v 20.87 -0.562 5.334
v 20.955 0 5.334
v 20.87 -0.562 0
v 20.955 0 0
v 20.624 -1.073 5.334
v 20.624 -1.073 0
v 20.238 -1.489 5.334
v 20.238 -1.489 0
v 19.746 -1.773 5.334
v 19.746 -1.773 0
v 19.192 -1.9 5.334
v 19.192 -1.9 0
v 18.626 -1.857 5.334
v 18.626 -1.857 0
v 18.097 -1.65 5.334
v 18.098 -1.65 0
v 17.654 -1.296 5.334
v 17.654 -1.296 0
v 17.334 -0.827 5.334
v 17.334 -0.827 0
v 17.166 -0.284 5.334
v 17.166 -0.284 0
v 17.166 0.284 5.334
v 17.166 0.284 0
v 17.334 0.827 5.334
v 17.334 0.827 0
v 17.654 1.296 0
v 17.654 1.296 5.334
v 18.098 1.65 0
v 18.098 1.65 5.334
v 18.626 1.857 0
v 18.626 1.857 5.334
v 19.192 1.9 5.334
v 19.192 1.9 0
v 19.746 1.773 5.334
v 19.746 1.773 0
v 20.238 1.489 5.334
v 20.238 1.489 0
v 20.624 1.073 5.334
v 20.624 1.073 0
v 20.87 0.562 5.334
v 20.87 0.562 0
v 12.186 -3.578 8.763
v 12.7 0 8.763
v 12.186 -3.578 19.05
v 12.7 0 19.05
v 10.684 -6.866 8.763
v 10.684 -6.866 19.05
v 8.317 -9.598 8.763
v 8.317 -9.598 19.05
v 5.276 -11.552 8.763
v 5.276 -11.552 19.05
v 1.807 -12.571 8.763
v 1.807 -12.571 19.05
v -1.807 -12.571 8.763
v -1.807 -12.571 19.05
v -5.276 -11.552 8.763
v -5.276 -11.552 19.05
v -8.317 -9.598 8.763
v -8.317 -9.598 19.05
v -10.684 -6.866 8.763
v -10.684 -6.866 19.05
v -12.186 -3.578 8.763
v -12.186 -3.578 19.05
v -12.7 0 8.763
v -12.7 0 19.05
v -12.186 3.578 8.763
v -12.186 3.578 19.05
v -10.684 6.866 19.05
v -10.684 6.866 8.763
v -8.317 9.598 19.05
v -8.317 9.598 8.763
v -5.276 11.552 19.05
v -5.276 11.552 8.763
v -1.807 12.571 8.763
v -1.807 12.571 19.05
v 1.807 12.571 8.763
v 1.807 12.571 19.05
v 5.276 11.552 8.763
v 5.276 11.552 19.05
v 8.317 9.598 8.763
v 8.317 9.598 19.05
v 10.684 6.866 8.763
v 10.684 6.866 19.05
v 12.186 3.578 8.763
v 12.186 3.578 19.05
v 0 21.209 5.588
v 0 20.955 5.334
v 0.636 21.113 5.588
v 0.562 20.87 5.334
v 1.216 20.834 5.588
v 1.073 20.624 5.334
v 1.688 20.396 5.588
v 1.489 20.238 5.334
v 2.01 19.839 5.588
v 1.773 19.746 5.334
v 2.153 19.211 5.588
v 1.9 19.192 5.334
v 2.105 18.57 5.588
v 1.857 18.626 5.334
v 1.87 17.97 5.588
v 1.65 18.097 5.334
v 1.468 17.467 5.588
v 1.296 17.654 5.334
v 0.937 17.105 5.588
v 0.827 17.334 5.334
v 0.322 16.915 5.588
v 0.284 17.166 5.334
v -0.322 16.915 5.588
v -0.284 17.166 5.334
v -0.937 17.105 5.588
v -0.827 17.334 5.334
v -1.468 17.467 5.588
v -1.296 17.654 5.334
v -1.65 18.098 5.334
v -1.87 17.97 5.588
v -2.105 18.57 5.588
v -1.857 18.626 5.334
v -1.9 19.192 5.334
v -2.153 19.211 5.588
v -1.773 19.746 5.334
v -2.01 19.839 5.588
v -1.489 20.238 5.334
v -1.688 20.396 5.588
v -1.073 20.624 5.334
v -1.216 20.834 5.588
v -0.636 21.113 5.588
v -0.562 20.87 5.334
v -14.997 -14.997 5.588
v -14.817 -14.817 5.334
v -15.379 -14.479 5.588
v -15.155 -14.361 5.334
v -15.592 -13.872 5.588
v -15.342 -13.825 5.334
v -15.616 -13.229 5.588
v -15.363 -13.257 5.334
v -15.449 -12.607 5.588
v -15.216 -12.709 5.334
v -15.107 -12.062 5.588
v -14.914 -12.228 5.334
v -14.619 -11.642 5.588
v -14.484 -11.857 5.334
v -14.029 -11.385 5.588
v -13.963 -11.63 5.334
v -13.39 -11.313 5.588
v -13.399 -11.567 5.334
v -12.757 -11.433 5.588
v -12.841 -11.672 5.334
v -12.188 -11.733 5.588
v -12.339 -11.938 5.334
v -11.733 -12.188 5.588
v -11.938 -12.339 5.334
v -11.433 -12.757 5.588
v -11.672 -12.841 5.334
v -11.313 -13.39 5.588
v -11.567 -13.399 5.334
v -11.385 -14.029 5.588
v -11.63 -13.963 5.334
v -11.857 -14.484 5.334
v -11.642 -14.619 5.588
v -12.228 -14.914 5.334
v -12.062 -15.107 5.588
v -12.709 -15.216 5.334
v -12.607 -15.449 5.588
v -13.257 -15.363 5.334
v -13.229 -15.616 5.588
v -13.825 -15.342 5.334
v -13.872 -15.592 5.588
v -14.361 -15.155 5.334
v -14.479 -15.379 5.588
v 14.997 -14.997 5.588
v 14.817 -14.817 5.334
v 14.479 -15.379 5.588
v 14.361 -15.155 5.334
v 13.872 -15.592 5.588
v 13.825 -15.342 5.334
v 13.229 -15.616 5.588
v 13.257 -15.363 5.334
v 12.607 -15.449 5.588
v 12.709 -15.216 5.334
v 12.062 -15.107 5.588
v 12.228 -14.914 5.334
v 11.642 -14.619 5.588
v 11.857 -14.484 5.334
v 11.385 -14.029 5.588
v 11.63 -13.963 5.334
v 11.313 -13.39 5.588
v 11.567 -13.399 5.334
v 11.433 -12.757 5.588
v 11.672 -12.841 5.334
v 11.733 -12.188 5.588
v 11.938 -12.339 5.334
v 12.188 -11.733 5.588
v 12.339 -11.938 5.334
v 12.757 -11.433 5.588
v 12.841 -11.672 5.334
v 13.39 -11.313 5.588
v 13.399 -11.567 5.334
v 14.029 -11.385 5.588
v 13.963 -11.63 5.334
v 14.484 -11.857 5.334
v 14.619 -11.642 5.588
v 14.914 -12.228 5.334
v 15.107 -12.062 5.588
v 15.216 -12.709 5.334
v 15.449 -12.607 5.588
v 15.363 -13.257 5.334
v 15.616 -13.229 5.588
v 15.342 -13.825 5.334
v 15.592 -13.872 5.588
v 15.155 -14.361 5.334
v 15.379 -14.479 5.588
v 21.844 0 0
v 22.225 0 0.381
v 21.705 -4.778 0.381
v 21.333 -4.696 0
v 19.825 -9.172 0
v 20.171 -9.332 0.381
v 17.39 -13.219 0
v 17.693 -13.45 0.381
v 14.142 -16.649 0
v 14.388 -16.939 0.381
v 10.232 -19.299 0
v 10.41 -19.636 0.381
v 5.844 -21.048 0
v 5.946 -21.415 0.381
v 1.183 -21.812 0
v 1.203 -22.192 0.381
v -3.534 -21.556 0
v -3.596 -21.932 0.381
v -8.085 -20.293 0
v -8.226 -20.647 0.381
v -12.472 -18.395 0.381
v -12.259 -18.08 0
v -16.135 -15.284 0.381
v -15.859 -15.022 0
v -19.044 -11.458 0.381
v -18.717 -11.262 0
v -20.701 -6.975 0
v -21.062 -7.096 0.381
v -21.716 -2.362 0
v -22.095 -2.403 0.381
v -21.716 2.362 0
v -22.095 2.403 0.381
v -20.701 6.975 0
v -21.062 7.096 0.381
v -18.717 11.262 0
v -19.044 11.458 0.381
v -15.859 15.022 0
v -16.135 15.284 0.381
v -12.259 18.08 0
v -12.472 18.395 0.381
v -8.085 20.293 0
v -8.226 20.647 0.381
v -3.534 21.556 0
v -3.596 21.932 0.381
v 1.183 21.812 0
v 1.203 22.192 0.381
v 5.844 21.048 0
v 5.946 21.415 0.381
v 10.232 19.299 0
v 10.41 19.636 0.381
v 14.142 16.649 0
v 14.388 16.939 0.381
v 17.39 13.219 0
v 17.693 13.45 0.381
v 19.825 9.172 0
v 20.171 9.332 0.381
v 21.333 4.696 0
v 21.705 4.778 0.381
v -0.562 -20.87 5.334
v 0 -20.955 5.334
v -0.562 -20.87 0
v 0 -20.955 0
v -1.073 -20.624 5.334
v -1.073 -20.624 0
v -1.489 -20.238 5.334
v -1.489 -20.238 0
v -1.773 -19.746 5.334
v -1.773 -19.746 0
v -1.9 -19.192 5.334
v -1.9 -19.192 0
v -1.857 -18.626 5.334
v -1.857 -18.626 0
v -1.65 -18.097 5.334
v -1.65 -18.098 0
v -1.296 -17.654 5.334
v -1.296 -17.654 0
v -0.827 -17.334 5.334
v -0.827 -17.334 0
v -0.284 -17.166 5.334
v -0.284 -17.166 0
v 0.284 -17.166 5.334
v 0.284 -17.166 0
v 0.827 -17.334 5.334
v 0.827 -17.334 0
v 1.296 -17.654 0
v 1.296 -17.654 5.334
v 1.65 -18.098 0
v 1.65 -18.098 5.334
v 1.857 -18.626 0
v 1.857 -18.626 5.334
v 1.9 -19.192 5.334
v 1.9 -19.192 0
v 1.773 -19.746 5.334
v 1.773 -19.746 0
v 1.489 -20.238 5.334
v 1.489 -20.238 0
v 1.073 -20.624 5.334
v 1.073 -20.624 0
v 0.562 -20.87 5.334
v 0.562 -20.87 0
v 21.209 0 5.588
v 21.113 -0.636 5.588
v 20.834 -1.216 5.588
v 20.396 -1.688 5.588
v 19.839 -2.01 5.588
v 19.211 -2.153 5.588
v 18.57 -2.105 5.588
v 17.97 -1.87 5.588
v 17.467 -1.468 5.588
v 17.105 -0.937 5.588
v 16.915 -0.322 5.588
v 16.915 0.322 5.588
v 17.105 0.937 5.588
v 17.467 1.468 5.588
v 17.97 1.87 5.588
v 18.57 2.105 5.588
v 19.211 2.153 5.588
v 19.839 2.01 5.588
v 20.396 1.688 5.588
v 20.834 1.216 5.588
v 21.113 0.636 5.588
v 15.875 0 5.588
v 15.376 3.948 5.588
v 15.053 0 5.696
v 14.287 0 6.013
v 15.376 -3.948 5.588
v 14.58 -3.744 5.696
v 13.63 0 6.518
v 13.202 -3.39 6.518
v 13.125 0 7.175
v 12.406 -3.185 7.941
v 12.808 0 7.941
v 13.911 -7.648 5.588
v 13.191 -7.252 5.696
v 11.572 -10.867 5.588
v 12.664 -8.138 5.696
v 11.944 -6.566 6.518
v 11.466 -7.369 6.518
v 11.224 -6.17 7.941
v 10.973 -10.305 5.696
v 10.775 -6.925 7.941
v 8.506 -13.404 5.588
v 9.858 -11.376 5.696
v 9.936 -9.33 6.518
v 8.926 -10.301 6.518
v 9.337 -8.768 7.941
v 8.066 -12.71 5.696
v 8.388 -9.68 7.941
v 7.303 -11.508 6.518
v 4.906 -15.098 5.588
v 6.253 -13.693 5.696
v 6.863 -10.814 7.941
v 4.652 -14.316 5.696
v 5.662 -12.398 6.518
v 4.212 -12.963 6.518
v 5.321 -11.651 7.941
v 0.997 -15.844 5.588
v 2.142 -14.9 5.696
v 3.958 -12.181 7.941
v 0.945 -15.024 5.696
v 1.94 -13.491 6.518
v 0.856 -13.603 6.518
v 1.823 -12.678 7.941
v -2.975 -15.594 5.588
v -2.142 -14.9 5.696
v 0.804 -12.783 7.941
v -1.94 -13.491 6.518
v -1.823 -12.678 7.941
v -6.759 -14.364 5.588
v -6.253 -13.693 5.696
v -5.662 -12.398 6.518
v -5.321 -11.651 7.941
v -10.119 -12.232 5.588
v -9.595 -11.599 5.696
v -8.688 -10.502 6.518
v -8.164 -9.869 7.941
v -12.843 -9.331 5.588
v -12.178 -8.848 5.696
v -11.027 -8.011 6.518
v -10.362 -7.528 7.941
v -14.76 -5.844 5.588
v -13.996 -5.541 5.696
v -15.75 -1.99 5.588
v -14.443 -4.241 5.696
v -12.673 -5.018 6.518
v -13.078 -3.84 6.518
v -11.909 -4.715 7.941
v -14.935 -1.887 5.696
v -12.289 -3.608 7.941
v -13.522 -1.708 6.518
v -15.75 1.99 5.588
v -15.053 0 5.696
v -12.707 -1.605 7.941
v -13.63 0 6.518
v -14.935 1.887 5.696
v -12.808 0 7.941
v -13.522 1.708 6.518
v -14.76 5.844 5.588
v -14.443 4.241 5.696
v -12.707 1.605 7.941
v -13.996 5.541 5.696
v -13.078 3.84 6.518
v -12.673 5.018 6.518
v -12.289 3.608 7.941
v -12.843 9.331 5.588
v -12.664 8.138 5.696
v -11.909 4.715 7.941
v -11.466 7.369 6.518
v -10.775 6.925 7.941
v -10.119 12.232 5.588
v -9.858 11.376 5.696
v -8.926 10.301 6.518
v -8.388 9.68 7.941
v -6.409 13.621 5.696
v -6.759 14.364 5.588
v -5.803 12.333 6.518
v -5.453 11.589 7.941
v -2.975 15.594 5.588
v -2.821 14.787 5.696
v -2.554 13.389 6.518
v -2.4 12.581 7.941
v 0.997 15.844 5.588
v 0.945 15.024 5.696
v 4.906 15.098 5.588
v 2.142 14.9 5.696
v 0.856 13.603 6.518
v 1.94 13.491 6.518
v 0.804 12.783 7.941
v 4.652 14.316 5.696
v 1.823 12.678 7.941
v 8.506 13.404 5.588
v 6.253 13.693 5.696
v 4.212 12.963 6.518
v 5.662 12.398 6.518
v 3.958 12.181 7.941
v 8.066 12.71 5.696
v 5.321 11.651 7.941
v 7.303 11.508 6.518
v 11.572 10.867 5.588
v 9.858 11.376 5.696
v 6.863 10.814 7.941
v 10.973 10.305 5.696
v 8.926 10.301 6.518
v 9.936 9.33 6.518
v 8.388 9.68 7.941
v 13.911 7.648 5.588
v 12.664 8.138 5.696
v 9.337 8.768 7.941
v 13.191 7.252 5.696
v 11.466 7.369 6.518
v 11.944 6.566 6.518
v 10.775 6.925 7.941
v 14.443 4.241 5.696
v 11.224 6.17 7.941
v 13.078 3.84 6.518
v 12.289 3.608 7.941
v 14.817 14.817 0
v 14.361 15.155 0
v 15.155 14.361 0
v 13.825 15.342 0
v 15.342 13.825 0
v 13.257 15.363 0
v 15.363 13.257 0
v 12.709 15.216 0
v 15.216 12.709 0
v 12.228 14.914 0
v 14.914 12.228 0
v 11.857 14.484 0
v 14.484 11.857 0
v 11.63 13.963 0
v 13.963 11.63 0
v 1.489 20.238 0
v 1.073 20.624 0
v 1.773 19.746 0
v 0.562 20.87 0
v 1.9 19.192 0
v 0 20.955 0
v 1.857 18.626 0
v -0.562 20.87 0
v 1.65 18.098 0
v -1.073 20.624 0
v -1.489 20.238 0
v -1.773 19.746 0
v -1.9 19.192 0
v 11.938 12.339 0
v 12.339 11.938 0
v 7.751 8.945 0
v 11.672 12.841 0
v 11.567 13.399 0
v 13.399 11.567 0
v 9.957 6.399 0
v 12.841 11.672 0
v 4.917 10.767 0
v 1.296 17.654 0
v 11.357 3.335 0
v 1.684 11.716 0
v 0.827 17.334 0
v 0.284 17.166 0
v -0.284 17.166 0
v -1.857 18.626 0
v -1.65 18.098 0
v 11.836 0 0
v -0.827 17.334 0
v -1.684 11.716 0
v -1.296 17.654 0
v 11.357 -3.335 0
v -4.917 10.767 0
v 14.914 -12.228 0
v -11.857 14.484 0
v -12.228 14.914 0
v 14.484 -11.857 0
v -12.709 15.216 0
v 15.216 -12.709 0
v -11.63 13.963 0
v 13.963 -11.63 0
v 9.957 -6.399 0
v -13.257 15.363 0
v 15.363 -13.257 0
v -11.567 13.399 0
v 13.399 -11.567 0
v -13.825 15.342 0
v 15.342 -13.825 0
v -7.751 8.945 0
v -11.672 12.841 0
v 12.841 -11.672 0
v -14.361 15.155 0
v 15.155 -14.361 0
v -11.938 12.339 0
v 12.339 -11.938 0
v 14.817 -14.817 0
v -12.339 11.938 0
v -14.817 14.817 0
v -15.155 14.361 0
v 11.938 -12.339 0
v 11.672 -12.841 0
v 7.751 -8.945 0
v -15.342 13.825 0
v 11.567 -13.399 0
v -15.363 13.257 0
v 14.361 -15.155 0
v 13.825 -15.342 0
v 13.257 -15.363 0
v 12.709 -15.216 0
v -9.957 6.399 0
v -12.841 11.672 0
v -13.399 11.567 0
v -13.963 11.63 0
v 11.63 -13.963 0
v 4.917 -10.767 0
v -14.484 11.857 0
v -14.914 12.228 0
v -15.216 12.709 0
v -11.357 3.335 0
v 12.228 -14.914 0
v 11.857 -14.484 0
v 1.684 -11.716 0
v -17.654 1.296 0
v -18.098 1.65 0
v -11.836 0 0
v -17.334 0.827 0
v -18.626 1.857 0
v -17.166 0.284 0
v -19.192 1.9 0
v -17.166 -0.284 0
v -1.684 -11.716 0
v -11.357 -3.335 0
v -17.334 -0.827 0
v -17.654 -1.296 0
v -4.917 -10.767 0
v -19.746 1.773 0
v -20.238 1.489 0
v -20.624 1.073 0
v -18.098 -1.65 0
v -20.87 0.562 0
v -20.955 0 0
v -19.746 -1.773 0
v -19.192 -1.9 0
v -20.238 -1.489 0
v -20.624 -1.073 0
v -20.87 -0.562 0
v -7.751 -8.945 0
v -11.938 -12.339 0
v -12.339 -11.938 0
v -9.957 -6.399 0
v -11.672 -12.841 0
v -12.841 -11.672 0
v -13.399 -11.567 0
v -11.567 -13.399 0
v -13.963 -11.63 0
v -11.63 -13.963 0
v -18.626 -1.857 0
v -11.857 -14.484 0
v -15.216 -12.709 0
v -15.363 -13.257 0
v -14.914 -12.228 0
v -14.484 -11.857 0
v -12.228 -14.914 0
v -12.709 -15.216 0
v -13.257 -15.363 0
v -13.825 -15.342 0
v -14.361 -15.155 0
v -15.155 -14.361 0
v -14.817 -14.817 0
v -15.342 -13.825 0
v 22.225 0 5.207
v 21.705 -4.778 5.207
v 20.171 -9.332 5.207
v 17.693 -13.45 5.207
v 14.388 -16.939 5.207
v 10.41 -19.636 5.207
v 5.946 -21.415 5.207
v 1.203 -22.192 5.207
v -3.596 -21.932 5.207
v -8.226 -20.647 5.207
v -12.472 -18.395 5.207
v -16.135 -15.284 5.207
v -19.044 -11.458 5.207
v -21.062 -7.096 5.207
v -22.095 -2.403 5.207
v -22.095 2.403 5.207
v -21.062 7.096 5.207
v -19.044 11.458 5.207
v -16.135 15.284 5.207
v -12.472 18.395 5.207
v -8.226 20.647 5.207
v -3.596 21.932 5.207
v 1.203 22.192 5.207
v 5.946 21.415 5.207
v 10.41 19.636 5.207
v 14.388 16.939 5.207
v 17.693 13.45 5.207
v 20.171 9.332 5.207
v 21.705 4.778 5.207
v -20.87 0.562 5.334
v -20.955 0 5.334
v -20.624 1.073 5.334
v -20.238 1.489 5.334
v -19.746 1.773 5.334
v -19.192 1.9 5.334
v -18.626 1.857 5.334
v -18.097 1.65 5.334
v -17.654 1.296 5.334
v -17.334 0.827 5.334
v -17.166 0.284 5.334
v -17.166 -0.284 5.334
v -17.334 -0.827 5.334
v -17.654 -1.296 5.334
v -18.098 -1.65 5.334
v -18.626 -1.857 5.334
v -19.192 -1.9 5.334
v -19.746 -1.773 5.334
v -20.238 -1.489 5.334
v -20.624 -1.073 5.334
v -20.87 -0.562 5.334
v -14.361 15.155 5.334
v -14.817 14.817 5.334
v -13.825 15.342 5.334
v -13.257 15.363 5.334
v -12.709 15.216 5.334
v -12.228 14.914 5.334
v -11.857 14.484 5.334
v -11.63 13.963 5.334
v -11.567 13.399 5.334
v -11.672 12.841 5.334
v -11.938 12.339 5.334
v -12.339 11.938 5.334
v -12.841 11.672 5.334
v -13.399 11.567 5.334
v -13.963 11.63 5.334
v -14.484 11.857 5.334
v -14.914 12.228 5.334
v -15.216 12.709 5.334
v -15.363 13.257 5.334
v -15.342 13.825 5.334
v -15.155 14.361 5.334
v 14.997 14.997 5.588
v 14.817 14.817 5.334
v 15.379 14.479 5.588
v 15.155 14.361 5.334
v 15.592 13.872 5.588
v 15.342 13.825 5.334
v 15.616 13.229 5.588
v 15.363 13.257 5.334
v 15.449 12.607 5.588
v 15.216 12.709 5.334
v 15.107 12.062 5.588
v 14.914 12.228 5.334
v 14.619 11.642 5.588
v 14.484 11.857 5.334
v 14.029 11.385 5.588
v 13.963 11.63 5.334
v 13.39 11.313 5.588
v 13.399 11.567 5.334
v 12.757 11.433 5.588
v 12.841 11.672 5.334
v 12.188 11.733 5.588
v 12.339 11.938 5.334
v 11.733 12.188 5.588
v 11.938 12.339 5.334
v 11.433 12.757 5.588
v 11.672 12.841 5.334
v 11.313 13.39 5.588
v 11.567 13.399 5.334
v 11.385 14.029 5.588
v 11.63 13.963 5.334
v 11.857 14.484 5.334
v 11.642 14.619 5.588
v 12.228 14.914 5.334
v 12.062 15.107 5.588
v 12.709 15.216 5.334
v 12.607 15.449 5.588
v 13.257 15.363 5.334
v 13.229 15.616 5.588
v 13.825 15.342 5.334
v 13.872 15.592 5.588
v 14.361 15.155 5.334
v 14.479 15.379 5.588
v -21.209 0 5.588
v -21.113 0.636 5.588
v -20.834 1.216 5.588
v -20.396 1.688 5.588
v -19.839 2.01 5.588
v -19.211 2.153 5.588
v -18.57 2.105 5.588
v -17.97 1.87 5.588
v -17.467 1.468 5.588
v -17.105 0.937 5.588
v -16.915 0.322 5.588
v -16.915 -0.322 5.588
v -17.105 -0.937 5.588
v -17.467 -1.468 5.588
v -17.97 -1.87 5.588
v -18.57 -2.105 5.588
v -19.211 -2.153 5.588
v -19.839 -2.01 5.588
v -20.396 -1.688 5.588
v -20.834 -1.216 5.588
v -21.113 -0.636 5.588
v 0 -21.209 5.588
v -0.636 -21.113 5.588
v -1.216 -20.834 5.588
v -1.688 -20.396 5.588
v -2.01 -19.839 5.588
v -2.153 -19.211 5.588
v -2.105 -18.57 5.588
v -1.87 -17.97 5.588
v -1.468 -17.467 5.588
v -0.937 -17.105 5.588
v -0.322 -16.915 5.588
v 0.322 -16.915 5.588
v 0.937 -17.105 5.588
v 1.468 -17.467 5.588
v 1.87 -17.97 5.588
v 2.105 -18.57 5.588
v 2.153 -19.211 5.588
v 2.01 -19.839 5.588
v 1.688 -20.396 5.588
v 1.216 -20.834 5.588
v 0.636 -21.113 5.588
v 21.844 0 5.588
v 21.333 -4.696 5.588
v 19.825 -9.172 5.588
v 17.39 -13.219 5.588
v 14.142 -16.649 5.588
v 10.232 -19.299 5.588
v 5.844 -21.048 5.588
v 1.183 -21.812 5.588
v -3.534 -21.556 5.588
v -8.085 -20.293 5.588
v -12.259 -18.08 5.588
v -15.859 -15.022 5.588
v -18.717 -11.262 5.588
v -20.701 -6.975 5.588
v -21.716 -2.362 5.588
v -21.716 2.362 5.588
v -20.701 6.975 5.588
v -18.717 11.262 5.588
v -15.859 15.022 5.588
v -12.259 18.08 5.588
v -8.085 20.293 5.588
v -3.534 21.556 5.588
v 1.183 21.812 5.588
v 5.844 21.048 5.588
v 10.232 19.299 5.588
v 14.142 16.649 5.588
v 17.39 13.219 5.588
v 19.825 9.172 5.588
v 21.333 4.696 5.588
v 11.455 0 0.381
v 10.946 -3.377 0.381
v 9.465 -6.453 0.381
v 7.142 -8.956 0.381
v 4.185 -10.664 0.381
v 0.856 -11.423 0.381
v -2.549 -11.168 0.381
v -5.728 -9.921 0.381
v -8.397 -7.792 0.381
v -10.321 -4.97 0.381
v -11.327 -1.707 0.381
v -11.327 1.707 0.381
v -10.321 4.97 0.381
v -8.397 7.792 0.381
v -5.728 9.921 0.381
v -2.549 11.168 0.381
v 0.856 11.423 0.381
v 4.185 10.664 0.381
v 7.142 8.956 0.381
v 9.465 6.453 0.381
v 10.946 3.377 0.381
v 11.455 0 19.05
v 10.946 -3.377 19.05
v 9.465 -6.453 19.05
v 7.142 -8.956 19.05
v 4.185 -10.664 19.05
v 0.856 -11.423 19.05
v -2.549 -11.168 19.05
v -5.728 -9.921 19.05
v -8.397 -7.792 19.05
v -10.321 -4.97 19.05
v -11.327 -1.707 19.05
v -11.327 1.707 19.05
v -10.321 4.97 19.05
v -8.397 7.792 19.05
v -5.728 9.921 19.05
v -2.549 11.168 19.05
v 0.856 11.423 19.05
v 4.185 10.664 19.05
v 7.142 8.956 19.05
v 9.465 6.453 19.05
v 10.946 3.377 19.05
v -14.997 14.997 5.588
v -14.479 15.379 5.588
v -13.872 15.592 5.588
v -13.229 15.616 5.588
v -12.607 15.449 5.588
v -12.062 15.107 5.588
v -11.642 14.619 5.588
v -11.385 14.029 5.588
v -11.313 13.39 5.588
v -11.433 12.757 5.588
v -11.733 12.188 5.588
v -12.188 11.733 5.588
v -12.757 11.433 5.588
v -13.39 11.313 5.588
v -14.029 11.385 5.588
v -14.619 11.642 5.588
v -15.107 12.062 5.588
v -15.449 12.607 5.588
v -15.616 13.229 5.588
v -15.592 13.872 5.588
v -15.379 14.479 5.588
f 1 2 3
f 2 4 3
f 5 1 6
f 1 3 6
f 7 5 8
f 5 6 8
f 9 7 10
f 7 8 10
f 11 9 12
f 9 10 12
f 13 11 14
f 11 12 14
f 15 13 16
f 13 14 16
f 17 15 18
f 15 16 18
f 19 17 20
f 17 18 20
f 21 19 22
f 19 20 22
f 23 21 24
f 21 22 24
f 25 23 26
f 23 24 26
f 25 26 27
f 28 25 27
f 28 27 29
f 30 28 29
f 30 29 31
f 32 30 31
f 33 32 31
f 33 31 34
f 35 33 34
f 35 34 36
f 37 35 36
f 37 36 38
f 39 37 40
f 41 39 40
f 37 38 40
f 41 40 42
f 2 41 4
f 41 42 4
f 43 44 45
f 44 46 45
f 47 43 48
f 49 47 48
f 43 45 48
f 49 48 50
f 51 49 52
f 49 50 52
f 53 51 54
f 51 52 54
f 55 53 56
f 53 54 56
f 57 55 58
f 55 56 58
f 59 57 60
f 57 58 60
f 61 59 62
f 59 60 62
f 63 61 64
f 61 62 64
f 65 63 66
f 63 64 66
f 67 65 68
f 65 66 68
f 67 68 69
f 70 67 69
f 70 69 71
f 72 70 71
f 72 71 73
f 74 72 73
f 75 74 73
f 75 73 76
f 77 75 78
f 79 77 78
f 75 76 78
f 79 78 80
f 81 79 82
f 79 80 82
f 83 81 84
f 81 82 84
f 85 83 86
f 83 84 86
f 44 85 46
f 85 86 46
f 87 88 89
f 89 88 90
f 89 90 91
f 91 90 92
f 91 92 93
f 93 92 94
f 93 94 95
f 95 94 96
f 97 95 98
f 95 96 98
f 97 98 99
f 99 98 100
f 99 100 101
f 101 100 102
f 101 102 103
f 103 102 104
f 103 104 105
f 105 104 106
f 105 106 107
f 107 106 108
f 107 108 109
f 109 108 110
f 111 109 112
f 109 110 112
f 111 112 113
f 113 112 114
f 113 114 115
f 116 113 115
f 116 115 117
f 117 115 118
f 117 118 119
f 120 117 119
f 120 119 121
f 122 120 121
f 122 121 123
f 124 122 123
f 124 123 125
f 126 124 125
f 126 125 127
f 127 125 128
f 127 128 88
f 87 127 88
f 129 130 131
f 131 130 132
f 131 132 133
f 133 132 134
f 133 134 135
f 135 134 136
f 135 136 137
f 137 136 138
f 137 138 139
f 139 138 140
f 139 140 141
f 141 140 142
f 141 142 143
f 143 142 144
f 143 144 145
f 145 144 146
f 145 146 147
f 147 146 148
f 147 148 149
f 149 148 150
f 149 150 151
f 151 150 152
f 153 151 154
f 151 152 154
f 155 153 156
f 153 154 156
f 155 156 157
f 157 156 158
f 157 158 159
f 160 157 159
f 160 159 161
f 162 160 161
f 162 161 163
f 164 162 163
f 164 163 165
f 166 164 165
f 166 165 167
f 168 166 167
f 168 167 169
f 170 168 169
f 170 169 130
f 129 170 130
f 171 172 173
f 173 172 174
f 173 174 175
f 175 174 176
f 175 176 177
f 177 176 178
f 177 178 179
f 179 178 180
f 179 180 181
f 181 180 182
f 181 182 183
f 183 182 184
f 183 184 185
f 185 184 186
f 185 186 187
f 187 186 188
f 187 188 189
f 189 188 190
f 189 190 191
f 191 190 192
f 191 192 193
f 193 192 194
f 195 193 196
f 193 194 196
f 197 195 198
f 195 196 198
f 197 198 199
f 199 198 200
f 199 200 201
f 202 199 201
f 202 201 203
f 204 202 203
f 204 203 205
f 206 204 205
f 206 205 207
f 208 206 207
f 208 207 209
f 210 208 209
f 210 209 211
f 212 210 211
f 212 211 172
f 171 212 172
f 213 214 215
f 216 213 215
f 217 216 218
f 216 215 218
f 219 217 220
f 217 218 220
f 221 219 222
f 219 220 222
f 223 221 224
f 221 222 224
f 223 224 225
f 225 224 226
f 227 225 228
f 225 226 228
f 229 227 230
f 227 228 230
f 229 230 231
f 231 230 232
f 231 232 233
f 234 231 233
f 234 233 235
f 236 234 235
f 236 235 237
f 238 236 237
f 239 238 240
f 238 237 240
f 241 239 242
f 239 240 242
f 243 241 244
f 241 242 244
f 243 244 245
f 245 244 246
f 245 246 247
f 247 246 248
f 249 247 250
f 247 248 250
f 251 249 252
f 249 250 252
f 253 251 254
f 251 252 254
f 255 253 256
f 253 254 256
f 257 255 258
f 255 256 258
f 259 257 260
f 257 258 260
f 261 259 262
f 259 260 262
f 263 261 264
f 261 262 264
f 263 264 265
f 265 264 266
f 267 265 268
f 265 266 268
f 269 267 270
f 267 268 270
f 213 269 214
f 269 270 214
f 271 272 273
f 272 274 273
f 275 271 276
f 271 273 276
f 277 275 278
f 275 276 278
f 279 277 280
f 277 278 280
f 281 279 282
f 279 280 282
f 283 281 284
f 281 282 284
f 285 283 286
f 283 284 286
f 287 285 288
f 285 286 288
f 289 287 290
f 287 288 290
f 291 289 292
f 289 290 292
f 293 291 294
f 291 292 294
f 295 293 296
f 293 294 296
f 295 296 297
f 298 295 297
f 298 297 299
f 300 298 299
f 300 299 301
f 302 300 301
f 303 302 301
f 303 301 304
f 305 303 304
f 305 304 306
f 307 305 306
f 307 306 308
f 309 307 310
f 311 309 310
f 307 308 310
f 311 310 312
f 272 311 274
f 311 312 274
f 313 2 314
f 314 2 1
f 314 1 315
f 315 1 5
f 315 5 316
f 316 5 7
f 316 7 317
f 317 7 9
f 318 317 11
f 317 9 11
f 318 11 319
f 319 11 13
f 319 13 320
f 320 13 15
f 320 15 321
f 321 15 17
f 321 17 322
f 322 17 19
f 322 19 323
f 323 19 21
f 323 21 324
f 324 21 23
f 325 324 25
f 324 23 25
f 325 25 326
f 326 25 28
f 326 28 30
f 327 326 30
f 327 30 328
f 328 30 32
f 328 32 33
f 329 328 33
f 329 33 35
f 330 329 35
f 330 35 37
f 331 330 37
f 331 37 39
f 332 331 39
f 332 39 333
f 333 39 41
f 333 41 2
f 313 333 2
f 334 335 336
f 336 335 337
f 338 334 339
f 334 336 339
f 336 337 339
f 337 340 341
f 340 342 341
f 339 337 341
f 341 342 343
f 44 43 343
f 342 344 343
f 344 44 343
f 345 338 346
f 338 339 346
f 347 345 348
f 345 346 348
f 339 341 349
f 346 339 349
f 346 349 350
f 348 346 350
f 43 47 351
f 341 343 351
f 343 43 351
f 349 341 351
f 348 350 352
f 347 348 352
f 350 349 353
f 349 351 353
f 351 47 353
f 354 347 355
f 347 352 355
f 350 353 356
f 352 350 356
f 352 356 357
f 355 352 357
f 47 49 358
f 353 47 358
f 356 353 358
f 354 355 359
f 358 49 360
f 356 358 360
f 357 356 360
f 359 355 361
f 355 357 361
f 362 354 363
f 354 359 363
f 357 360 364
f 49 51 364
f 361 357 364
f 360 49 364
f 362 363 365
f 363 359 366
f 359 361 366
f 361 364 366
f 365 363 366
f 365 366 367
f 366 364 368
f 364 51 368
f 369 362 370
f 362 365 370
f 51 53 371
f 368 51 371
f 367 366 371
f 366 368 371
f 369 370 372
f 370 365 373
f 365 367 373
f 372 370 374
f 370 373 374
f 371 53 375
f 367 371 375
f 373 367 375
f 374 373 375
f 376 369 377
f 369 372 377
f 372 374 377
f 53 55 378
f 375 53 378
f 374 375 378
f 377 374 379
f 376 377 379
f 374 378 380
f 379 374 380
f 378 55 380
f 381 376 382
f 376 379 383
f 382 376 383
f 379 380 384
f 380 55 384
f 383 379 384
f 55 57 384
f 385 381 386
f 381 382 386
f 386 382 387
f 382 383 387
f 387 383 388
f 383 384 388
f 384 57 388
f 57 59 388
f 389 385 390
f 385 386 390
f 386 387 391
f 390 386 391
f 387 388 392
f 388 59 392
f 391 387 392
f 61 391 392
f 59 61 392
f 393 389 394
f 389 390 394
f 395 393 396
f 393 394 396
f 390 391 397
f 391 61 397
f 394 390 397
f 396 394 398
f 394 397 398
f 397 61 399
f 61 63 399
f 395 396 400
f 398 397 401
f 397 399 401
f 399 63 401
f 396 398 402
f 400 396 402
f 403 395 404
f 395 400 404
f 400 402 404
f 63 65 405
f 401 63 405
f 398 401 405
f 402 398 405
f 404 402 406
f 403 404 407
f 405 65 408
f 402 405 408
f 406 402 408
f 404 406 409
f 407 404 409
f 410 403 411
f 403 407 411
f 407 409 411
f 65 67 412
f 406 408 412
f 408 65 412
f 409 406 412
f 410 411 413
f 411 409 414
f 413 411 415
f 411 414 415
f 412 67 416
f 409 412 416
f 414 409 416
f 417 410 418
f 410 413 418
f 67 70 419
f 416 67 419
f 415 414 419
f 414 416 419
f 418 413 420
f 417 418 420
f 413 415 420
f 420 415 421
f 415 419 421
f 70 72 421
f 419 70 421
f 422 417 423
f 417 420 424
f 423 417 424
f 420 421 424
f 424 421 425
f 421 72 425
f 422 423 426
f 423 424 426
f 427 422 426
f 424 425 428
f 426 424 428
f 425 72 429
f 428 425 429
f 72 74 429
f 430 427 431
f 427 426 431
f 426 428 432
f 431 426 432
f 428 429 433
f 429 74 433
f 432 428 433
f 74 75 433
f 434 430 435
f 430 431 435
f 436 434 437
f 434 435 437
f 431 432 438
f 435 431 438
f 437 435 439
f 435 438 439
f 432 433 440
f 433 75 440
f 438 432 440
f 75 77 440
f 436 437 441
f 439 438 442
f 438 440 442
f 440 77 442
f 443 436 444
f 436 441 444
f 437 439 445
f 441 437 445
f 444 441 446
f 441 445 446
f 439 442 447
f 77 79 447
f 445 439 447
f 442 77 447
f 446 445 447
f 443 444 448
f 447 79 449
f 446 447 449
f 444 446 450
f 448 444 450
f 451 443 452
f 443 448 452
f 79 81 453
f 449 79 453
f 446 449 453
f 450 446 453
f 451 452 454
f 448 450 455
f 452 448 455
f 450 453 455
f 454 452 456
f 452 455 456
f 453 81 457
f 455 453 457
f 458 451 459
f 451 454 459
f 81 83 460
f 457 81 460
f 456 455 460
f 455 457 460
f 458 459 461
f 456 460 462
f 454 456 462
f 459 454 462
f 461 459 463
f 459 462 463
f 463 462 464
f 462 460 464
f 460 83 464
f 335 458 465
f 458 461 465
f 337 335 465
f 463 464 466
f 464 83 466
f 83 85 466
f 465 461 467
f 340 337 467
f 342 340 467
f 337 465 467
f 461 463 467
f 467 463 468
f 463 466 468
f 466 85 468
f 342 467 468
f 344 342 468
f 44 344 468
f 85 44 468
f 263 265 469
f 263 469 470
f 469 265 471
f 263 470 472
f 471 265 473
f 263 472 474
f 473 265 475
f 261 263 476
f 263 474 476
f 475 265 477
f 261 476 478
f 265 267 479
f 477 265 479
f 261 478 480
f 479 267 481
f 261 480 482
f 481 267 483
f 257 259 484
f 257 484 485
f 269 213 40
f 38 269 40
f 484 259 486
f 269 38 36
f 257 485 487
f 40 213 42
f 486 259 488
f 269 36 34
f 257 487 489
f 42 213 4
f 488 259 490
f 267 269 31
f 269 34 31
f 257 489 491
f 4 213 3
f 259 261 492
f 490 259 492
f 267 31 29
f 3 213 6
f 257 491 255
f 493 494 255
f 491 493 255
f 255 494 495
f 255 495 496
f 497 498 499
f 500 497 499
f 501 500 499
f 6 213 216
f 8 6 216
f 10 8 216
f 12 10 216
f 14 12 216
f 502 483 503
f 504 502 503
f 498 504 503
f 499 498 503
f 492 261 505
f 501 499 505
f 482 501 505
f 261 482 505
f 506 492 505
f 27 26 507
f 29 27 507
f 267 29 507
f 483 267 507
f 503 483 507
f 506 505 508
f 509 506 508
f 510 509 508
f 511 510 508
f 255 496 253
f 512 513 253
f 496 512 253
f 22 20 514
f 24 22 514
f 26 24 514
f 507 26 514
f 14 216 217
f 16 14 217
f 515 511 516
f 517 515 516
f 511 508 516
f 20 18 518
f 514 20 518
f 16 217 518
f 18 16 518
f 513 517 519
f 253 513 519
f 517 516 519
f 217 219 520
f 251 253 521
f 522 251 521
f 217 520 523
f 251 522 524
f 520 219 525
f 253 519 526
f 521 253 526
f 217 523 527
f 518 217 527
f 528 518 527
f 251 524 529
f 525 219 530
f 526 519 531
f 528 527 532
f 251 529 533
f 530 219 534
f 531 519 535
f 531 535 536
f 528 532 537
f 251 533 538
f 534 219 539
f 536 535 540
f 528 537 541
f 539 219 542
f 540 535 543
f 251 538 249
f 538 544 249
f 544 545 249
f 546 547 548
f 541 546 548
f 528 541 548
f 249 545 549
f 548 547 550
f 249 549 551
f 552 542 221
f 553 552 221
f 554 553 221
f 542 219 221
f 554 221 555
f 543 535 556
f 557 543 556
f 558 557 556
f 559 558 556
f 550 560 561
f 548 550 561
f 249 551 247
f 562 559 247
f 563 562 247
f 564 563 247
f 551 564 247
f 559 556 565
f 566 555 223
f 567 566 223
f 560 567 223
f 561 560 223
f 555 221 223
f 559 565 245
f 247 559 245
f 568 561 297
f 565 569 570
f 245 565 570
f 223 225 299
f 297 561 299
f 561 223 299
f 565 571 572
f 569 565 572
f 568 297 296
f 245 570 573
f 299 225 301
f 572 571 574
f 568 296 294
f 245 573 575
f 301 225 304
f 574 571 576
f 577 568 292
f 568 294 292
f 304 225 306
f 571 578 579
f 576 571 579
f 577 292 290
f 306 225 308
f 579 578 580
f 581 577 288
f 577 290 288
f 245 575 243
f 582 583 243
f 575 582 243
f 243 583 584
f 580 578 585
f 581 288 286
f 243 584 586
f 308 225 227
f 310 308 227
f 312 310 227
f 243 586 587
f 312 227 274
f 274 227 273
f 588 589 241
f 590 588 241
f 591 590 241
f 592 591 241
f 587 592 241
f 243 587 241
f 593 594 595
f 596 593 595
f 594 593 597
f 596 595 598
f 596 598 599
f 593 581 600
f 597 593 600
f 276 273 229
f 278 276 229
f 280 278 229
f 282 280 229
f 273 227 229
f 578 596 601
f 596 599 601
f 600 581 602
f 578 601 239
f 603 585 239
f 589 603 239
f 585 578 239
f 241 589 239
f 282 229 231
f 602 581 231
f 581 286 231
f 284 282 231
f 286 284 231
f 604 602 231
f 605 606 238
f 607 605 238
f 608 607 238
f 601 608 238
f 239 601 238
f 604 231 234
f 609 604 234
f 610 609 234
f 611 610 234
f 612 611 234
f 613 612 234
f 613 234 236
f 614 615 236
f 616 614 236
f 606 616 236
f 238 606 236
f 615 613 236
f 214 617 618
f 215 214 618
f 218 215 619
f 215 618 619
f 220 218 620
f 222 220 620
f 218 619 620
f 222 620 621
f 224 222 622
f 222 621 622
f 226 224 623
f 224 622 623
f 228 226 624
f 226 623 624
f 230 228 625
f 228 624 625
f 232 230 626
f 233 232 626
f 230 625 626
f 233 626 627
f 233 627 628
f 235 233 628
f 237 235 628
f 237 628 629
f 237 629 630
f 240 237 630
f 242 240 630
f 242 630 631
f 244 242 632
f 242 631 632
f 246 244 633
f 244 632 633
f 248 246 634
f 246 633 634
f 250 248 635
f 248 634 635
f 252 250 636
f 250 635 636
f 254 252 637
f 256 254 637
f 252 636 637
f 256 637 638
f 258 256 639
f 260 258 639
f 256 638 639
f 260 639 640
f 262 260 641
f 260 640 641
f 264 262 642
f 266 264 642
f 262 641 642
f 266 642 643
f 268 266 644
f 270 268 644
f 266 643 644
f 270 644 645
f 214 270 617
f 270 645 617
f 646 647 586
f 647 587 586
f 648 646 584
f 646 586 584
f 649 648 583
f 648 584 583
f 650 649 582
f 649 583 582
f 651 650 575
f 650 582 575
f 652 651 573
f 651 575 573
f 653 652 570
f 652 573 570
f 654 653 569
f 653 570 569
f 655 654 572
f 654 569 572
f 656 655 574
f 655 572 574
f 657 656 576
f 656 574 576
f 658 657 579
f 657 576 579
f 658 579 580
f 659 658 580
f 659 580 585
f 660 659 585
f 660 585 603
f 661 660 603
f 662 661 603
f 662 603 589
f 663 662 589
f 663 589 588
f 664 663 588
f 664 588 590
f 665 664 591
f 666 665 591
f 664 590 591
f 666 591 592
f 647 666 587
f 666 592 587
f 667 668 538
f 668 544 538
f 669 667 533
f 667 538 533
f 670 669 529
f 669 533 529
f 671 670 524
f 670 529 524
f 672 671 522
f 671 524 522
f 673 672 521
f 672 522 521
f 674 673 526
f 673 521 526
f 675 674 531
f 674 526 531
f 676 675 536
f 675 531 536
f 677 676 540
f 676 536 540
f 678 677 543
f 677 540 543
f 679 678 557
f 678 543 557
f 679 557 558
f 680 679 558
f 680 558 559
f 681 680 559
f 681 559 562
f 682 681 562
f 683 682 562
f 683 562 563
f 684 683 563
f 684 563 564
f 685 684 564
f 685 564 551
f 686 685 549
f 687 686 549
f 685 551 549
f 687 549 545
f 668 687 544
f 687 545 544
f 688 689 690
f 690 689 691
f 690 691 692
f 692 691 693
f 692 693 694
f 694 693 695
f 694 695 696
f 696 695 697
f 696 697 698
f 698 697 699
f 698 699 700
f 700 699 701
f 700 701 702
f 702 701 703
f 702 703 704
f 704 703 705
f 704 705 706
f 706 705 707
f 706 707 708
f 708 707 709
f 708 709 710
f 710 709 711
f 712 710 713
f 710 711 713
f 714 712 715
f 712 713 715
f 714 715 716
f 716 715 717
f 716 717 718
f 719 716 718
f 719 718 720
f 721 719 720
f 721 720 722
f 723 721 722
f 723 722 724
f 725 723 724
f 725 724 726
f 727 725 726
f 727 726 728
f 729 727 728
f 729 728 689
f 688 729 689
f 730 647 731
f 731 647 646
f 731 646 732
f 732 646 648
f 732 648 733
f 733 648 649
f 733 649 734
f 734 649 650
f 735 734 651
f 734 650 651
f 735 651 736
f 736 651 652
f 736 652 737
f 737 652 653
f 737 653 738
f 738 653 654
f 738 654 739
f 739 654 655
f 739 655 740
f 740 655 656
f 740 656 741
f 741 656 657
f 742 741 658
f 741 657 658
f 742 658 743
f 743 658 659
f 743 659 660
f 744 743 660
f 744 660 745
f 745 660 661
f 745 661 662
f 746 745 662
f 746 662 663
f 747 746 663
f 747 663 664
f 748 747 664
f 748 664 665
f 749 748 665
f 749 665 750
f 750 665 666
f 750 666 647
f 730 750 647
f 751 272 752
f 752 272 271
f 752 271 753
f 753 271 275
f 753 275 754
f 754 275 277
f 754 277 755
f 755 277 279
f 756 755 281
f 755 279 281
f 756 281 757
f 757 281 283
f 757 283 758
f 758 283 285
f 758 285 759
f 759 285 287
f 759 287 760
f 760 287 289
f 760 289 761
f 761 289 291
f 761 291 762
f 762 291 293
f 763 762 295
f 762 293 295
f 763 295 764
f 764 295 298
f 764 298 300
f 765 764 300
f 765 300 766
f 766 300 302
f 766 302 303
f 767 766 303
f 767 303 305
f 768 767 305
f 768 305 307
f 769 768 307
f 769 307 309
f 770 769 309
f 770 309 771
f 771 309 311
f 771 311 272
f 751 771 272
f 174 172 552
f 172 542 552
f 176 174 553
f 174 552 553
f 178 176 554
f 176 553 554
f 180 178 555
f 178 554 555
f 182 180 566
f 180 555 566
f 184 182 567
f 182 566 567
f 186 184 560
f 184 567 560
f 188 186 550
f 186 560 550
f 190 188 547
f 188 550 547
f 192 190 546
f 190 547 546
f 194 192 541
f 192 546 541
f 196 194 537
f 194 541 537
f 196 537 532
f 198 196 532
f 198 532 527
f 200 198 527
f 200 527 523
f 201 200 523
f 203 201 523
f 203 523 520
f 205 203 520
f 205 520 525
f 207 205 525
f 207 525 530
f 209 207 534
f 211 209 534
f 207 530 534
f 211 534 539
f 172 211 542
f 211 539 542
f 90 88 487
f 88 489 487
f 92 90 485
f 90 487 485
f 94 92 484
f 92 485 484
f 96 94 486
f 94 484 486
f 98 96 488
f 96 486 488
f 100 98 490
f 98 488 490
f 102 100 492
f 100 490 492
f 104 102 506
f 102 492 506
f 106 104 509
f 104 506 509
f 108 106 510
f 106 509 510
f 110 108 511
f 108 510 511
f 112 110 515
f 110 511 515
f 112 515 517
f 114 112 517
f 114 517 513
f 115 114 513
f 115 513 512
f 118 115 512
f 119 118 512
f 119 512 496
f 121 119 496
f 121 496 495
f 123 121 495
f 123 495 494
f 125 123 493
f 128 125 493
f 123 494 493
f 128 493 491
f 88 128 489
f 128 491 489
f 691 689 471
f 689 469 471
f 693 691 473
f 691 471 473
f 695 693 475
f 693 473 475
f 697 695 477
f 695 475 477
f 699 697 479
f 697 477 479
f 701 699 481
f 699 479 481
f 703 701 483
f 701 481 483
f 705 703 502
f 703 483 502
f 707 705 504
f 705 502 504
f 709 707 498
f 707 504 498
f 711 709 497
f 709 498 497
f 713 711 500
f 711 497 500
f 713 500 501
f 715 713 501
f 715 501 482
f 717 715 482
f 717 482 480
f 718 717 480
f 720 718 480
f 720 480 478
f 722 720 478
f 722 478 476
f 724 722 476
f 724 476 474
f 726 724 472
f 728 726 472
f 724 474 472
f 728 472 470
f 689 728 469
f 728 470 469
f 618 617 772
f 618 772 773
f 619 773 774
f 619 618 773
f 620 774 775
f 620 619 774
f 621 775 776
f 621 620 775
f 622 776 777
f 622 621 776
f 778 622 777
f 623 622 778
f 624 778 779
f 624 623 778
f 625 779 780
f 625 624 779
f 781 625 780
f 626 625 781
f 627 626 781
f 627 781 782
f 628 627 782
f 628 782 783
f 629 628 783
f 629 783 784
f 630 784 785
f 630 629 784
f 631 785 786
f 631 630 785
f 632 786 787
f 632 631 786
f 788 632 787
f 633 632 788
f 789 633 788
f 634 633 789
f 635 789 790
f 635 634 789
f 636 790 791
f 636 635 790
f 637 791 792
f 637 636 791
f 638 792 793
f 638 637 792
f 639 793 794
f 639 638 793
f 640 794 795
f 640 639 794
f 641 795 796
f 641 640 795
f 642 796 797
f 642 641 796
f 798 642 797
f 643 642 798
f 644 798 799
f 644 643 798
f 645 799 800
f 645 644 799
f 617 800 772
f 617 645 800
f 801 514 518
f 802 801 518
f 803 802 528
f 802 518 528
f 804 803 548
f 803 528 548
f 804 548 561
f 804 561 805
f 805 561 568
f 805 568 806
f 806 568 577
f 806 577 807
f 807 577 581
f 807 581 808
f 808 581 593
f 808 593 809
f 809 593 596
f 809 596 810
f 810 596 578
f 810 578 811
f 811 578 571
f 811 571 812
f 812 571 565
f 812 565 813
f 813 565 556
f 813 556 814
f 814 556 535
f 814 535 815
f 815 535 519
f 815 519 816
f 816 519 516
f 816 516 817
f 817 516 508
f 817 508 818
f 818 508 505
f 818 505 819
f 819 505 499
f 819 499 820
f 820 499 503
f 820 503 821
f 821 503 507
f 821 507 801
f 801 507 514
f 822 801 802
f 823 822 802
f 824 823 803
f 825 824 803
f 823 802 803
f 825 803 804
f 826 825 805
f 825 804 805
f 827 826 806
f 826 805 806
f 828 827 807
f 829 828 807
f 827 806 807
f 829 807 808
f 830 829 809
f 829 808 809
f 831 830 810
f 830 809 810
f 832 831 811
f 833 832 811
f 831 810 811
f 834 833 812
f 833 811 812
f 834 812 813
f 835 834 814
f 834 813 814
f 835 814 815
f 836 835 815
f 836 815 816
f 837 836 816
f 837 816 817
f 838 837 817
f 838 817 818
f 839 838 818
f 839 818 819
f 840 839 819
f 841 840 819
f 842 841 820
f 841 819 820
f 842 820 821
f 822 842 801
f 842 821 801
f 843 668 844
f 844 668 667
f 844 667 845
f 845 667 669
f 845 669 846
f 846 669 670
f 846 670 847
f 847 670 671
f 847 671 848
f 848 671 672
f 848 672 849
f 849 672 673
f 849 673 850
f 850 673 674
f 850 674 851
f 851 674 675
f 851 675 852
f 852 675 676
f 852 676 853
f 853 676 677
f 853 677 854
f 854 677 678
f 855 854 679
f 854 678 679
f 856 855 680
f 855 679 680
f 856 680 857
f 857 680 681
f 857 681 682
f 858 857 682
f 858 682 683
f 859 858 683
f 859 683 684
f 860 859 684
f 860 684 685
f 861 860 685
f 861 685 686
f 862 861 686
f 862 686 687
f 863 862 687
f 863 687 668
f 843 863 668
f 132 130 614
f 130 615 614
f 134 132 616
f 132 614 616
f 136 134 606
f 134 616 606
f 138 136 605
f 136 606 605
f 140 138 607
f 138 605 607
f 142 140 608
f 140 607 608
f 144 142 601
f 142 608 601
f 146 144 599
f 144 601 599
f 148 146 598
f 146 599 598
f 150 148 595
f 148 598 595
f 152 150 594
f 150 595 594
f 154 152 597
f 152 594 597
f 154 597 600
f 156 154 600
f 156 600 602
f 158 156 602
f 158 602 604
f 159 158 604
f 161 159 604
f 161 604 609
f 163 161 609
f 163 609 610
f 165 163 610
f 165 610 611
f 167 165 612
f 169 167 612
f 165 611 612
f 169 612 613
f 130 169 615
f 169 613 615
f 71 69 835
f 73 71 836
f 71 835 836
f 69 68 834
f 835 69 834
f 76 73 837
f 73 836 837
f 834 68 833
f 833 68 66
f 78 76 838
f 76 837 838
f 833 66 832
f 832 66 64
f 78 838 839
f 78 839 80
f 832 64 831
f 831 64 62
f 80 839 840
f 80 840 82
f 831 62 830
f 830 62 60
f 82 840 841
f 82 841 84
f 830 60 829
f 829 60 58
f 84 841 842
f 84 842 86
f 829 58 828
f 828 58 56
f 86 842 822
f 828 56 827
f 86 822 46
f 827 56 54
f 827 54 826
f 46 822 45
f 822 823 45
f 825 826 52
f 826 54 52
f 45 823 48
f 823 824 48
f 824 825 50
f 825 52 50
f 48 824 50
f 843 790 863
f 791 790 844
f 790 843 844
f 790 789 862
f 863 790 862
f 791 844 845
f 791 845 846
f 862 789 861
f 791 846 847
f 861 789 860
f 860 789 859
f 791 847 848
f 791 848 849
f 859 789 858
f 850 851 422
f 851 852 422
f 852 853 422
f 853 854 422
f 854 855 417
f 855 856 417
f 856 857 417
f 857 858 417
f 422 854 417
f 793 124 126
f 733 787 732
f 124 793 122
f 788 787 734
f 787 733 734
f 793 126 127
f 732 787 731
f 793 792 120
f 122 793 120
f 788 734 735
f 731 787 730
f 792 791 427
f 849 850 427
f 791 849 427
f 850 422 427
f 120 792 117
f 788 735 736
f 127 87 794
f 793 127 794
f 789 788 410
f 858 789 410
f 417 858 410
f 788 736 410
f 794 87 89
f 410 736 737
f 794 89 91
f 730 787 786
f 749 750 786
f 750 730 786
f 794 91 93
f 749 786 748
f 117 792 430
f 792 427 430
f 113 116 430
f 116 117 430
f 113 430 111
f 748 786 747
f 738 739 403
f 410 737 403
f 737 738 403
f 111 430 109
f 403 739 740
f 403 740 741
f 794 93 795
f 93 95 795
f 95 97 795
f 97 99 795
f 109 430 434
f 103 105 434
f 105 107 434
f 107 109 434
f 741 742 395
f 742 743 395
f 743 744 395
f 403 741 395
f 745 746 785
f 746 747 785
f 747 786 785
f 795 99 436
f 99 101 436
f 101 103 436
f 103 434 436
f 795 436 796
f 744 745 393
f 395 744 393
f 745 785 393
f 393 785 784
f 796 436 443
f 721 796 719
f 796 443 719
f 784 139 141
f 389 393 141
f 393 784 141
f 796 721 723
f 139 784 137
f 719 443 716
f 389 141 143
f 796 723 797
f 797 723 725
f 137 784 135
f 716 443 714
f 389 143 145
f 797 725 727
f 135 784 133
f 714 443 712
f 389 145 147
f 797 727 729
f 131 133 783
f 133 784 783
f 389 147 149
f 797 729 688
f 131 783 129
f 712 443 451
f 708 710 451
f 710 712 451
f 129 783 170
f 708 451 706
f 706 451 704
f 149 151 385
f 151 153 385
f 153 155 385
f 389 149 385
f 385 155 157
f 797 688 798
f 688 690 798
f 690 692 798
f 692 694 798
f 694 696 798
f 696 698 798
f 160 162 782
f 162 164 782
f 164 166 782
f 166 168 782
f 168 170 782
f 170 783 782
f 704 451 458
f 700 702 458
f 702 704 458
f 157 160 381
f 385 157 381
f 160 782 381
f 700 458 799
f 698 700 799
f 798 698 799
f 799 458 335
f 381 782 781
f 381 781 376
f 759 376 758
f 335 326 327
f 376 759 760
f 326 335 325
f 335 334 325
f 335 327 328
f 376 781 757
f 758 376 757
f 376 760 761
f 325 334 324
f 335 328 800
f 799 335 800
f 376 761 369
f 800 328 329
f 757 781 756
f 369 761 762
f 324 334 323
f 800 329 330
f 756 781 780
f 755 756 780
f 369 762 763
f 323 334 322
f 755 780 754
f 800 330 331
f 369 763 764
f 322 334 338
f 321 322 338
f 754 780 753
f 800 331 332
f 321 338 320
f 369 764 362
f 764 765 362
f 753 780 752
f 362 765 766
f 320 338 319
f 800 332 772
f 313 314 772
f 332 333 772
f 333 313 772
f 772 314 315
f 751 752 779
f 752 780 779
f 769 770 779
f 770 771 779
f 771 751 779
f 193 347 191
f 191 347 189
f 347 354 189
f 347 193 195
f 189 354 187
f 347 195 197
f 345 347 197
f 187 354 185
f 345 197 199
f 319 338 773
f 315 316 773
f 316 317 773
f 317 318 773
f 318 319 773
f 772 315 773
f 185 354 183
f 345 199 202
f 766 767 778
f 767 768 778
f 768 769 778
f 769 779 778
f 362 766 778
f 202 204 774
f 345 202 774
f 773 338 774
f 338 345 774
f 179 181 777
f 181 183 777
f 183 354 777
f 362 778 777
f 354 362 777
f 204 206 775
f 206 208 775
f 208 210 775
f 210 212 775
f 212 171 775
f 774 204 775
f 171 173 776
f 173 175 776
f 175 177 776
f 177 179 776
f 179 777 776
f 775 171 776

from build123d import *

# Parameters (mm, degrees)
F3_D            = 3.81
F3_CSINK_D      = 4.318
F3_CSINK_ANGLE  = 90
F3_COPIES_COUNT = 8
F4_SIZE2        = 0.381
F4_SIZE         = 0.381


# Not quite as in the source:
# - a pattern or mirror of a feature is missing from the dataset's text; its kind, count and spacing are read off the source's solid


with BuildPart() as f1:
    # F0 (on Front) → F1 (revolve)
    with BuildSketch(Plane.XZ):
        with BuildLine():
            Line((12.7, 19.05), (11.4554, 19.05))
            Line((11.4554, 19.05), (11.4554, 0))
            Line((11.4554, 0), (22.225, 0))
            Line((22.225, 0), (22.225, 5.588))
            Line((22.225, 5.588), (15.875, 5.588))
            ThreePointArc((15.875, 5.588), (13.6299359697, 6.5179359697), (12.7, 8.763))
            Line((12.7, 8.763), (12.7, 19.05))
        make_face()
    revolve(axis=Axis((0, 0, -8.7907983398), (0, 0, -1)))

    # F3 (through all)
    with Locations(Plane.XY.offset(5.588)):
        with Locations((-19.05, 0)):
            f3 = CounterSinkHole(F3_D / 2, F3_CSINK_D / 2, counter_sink_angle=F3_CSINK_ANGLE)

    # F3_copies: F3 ×8 about axis
    f3_copies_axis = Axis((0, 0, 0), (0, 0, 1))
    for i in range(1, F3_COPIES_COUNT):
        add(f3.rotate(f3_copies_axis, i * 360 / F3_COPIES_COUNT), mode=Mode.SUBTRACT)

    # F4
    f4_edges = [f1.edges().sort_by_distance(p)[0] for p in [
        (-22.225, 0, 5.588),
        (-22.225, 0, 0),
        (-11.4554, 0, 0),
    ]]
    chamfer(f4_edges, length=F4_SIZE, length2=F4_SIZE2)


solid = f1.part
